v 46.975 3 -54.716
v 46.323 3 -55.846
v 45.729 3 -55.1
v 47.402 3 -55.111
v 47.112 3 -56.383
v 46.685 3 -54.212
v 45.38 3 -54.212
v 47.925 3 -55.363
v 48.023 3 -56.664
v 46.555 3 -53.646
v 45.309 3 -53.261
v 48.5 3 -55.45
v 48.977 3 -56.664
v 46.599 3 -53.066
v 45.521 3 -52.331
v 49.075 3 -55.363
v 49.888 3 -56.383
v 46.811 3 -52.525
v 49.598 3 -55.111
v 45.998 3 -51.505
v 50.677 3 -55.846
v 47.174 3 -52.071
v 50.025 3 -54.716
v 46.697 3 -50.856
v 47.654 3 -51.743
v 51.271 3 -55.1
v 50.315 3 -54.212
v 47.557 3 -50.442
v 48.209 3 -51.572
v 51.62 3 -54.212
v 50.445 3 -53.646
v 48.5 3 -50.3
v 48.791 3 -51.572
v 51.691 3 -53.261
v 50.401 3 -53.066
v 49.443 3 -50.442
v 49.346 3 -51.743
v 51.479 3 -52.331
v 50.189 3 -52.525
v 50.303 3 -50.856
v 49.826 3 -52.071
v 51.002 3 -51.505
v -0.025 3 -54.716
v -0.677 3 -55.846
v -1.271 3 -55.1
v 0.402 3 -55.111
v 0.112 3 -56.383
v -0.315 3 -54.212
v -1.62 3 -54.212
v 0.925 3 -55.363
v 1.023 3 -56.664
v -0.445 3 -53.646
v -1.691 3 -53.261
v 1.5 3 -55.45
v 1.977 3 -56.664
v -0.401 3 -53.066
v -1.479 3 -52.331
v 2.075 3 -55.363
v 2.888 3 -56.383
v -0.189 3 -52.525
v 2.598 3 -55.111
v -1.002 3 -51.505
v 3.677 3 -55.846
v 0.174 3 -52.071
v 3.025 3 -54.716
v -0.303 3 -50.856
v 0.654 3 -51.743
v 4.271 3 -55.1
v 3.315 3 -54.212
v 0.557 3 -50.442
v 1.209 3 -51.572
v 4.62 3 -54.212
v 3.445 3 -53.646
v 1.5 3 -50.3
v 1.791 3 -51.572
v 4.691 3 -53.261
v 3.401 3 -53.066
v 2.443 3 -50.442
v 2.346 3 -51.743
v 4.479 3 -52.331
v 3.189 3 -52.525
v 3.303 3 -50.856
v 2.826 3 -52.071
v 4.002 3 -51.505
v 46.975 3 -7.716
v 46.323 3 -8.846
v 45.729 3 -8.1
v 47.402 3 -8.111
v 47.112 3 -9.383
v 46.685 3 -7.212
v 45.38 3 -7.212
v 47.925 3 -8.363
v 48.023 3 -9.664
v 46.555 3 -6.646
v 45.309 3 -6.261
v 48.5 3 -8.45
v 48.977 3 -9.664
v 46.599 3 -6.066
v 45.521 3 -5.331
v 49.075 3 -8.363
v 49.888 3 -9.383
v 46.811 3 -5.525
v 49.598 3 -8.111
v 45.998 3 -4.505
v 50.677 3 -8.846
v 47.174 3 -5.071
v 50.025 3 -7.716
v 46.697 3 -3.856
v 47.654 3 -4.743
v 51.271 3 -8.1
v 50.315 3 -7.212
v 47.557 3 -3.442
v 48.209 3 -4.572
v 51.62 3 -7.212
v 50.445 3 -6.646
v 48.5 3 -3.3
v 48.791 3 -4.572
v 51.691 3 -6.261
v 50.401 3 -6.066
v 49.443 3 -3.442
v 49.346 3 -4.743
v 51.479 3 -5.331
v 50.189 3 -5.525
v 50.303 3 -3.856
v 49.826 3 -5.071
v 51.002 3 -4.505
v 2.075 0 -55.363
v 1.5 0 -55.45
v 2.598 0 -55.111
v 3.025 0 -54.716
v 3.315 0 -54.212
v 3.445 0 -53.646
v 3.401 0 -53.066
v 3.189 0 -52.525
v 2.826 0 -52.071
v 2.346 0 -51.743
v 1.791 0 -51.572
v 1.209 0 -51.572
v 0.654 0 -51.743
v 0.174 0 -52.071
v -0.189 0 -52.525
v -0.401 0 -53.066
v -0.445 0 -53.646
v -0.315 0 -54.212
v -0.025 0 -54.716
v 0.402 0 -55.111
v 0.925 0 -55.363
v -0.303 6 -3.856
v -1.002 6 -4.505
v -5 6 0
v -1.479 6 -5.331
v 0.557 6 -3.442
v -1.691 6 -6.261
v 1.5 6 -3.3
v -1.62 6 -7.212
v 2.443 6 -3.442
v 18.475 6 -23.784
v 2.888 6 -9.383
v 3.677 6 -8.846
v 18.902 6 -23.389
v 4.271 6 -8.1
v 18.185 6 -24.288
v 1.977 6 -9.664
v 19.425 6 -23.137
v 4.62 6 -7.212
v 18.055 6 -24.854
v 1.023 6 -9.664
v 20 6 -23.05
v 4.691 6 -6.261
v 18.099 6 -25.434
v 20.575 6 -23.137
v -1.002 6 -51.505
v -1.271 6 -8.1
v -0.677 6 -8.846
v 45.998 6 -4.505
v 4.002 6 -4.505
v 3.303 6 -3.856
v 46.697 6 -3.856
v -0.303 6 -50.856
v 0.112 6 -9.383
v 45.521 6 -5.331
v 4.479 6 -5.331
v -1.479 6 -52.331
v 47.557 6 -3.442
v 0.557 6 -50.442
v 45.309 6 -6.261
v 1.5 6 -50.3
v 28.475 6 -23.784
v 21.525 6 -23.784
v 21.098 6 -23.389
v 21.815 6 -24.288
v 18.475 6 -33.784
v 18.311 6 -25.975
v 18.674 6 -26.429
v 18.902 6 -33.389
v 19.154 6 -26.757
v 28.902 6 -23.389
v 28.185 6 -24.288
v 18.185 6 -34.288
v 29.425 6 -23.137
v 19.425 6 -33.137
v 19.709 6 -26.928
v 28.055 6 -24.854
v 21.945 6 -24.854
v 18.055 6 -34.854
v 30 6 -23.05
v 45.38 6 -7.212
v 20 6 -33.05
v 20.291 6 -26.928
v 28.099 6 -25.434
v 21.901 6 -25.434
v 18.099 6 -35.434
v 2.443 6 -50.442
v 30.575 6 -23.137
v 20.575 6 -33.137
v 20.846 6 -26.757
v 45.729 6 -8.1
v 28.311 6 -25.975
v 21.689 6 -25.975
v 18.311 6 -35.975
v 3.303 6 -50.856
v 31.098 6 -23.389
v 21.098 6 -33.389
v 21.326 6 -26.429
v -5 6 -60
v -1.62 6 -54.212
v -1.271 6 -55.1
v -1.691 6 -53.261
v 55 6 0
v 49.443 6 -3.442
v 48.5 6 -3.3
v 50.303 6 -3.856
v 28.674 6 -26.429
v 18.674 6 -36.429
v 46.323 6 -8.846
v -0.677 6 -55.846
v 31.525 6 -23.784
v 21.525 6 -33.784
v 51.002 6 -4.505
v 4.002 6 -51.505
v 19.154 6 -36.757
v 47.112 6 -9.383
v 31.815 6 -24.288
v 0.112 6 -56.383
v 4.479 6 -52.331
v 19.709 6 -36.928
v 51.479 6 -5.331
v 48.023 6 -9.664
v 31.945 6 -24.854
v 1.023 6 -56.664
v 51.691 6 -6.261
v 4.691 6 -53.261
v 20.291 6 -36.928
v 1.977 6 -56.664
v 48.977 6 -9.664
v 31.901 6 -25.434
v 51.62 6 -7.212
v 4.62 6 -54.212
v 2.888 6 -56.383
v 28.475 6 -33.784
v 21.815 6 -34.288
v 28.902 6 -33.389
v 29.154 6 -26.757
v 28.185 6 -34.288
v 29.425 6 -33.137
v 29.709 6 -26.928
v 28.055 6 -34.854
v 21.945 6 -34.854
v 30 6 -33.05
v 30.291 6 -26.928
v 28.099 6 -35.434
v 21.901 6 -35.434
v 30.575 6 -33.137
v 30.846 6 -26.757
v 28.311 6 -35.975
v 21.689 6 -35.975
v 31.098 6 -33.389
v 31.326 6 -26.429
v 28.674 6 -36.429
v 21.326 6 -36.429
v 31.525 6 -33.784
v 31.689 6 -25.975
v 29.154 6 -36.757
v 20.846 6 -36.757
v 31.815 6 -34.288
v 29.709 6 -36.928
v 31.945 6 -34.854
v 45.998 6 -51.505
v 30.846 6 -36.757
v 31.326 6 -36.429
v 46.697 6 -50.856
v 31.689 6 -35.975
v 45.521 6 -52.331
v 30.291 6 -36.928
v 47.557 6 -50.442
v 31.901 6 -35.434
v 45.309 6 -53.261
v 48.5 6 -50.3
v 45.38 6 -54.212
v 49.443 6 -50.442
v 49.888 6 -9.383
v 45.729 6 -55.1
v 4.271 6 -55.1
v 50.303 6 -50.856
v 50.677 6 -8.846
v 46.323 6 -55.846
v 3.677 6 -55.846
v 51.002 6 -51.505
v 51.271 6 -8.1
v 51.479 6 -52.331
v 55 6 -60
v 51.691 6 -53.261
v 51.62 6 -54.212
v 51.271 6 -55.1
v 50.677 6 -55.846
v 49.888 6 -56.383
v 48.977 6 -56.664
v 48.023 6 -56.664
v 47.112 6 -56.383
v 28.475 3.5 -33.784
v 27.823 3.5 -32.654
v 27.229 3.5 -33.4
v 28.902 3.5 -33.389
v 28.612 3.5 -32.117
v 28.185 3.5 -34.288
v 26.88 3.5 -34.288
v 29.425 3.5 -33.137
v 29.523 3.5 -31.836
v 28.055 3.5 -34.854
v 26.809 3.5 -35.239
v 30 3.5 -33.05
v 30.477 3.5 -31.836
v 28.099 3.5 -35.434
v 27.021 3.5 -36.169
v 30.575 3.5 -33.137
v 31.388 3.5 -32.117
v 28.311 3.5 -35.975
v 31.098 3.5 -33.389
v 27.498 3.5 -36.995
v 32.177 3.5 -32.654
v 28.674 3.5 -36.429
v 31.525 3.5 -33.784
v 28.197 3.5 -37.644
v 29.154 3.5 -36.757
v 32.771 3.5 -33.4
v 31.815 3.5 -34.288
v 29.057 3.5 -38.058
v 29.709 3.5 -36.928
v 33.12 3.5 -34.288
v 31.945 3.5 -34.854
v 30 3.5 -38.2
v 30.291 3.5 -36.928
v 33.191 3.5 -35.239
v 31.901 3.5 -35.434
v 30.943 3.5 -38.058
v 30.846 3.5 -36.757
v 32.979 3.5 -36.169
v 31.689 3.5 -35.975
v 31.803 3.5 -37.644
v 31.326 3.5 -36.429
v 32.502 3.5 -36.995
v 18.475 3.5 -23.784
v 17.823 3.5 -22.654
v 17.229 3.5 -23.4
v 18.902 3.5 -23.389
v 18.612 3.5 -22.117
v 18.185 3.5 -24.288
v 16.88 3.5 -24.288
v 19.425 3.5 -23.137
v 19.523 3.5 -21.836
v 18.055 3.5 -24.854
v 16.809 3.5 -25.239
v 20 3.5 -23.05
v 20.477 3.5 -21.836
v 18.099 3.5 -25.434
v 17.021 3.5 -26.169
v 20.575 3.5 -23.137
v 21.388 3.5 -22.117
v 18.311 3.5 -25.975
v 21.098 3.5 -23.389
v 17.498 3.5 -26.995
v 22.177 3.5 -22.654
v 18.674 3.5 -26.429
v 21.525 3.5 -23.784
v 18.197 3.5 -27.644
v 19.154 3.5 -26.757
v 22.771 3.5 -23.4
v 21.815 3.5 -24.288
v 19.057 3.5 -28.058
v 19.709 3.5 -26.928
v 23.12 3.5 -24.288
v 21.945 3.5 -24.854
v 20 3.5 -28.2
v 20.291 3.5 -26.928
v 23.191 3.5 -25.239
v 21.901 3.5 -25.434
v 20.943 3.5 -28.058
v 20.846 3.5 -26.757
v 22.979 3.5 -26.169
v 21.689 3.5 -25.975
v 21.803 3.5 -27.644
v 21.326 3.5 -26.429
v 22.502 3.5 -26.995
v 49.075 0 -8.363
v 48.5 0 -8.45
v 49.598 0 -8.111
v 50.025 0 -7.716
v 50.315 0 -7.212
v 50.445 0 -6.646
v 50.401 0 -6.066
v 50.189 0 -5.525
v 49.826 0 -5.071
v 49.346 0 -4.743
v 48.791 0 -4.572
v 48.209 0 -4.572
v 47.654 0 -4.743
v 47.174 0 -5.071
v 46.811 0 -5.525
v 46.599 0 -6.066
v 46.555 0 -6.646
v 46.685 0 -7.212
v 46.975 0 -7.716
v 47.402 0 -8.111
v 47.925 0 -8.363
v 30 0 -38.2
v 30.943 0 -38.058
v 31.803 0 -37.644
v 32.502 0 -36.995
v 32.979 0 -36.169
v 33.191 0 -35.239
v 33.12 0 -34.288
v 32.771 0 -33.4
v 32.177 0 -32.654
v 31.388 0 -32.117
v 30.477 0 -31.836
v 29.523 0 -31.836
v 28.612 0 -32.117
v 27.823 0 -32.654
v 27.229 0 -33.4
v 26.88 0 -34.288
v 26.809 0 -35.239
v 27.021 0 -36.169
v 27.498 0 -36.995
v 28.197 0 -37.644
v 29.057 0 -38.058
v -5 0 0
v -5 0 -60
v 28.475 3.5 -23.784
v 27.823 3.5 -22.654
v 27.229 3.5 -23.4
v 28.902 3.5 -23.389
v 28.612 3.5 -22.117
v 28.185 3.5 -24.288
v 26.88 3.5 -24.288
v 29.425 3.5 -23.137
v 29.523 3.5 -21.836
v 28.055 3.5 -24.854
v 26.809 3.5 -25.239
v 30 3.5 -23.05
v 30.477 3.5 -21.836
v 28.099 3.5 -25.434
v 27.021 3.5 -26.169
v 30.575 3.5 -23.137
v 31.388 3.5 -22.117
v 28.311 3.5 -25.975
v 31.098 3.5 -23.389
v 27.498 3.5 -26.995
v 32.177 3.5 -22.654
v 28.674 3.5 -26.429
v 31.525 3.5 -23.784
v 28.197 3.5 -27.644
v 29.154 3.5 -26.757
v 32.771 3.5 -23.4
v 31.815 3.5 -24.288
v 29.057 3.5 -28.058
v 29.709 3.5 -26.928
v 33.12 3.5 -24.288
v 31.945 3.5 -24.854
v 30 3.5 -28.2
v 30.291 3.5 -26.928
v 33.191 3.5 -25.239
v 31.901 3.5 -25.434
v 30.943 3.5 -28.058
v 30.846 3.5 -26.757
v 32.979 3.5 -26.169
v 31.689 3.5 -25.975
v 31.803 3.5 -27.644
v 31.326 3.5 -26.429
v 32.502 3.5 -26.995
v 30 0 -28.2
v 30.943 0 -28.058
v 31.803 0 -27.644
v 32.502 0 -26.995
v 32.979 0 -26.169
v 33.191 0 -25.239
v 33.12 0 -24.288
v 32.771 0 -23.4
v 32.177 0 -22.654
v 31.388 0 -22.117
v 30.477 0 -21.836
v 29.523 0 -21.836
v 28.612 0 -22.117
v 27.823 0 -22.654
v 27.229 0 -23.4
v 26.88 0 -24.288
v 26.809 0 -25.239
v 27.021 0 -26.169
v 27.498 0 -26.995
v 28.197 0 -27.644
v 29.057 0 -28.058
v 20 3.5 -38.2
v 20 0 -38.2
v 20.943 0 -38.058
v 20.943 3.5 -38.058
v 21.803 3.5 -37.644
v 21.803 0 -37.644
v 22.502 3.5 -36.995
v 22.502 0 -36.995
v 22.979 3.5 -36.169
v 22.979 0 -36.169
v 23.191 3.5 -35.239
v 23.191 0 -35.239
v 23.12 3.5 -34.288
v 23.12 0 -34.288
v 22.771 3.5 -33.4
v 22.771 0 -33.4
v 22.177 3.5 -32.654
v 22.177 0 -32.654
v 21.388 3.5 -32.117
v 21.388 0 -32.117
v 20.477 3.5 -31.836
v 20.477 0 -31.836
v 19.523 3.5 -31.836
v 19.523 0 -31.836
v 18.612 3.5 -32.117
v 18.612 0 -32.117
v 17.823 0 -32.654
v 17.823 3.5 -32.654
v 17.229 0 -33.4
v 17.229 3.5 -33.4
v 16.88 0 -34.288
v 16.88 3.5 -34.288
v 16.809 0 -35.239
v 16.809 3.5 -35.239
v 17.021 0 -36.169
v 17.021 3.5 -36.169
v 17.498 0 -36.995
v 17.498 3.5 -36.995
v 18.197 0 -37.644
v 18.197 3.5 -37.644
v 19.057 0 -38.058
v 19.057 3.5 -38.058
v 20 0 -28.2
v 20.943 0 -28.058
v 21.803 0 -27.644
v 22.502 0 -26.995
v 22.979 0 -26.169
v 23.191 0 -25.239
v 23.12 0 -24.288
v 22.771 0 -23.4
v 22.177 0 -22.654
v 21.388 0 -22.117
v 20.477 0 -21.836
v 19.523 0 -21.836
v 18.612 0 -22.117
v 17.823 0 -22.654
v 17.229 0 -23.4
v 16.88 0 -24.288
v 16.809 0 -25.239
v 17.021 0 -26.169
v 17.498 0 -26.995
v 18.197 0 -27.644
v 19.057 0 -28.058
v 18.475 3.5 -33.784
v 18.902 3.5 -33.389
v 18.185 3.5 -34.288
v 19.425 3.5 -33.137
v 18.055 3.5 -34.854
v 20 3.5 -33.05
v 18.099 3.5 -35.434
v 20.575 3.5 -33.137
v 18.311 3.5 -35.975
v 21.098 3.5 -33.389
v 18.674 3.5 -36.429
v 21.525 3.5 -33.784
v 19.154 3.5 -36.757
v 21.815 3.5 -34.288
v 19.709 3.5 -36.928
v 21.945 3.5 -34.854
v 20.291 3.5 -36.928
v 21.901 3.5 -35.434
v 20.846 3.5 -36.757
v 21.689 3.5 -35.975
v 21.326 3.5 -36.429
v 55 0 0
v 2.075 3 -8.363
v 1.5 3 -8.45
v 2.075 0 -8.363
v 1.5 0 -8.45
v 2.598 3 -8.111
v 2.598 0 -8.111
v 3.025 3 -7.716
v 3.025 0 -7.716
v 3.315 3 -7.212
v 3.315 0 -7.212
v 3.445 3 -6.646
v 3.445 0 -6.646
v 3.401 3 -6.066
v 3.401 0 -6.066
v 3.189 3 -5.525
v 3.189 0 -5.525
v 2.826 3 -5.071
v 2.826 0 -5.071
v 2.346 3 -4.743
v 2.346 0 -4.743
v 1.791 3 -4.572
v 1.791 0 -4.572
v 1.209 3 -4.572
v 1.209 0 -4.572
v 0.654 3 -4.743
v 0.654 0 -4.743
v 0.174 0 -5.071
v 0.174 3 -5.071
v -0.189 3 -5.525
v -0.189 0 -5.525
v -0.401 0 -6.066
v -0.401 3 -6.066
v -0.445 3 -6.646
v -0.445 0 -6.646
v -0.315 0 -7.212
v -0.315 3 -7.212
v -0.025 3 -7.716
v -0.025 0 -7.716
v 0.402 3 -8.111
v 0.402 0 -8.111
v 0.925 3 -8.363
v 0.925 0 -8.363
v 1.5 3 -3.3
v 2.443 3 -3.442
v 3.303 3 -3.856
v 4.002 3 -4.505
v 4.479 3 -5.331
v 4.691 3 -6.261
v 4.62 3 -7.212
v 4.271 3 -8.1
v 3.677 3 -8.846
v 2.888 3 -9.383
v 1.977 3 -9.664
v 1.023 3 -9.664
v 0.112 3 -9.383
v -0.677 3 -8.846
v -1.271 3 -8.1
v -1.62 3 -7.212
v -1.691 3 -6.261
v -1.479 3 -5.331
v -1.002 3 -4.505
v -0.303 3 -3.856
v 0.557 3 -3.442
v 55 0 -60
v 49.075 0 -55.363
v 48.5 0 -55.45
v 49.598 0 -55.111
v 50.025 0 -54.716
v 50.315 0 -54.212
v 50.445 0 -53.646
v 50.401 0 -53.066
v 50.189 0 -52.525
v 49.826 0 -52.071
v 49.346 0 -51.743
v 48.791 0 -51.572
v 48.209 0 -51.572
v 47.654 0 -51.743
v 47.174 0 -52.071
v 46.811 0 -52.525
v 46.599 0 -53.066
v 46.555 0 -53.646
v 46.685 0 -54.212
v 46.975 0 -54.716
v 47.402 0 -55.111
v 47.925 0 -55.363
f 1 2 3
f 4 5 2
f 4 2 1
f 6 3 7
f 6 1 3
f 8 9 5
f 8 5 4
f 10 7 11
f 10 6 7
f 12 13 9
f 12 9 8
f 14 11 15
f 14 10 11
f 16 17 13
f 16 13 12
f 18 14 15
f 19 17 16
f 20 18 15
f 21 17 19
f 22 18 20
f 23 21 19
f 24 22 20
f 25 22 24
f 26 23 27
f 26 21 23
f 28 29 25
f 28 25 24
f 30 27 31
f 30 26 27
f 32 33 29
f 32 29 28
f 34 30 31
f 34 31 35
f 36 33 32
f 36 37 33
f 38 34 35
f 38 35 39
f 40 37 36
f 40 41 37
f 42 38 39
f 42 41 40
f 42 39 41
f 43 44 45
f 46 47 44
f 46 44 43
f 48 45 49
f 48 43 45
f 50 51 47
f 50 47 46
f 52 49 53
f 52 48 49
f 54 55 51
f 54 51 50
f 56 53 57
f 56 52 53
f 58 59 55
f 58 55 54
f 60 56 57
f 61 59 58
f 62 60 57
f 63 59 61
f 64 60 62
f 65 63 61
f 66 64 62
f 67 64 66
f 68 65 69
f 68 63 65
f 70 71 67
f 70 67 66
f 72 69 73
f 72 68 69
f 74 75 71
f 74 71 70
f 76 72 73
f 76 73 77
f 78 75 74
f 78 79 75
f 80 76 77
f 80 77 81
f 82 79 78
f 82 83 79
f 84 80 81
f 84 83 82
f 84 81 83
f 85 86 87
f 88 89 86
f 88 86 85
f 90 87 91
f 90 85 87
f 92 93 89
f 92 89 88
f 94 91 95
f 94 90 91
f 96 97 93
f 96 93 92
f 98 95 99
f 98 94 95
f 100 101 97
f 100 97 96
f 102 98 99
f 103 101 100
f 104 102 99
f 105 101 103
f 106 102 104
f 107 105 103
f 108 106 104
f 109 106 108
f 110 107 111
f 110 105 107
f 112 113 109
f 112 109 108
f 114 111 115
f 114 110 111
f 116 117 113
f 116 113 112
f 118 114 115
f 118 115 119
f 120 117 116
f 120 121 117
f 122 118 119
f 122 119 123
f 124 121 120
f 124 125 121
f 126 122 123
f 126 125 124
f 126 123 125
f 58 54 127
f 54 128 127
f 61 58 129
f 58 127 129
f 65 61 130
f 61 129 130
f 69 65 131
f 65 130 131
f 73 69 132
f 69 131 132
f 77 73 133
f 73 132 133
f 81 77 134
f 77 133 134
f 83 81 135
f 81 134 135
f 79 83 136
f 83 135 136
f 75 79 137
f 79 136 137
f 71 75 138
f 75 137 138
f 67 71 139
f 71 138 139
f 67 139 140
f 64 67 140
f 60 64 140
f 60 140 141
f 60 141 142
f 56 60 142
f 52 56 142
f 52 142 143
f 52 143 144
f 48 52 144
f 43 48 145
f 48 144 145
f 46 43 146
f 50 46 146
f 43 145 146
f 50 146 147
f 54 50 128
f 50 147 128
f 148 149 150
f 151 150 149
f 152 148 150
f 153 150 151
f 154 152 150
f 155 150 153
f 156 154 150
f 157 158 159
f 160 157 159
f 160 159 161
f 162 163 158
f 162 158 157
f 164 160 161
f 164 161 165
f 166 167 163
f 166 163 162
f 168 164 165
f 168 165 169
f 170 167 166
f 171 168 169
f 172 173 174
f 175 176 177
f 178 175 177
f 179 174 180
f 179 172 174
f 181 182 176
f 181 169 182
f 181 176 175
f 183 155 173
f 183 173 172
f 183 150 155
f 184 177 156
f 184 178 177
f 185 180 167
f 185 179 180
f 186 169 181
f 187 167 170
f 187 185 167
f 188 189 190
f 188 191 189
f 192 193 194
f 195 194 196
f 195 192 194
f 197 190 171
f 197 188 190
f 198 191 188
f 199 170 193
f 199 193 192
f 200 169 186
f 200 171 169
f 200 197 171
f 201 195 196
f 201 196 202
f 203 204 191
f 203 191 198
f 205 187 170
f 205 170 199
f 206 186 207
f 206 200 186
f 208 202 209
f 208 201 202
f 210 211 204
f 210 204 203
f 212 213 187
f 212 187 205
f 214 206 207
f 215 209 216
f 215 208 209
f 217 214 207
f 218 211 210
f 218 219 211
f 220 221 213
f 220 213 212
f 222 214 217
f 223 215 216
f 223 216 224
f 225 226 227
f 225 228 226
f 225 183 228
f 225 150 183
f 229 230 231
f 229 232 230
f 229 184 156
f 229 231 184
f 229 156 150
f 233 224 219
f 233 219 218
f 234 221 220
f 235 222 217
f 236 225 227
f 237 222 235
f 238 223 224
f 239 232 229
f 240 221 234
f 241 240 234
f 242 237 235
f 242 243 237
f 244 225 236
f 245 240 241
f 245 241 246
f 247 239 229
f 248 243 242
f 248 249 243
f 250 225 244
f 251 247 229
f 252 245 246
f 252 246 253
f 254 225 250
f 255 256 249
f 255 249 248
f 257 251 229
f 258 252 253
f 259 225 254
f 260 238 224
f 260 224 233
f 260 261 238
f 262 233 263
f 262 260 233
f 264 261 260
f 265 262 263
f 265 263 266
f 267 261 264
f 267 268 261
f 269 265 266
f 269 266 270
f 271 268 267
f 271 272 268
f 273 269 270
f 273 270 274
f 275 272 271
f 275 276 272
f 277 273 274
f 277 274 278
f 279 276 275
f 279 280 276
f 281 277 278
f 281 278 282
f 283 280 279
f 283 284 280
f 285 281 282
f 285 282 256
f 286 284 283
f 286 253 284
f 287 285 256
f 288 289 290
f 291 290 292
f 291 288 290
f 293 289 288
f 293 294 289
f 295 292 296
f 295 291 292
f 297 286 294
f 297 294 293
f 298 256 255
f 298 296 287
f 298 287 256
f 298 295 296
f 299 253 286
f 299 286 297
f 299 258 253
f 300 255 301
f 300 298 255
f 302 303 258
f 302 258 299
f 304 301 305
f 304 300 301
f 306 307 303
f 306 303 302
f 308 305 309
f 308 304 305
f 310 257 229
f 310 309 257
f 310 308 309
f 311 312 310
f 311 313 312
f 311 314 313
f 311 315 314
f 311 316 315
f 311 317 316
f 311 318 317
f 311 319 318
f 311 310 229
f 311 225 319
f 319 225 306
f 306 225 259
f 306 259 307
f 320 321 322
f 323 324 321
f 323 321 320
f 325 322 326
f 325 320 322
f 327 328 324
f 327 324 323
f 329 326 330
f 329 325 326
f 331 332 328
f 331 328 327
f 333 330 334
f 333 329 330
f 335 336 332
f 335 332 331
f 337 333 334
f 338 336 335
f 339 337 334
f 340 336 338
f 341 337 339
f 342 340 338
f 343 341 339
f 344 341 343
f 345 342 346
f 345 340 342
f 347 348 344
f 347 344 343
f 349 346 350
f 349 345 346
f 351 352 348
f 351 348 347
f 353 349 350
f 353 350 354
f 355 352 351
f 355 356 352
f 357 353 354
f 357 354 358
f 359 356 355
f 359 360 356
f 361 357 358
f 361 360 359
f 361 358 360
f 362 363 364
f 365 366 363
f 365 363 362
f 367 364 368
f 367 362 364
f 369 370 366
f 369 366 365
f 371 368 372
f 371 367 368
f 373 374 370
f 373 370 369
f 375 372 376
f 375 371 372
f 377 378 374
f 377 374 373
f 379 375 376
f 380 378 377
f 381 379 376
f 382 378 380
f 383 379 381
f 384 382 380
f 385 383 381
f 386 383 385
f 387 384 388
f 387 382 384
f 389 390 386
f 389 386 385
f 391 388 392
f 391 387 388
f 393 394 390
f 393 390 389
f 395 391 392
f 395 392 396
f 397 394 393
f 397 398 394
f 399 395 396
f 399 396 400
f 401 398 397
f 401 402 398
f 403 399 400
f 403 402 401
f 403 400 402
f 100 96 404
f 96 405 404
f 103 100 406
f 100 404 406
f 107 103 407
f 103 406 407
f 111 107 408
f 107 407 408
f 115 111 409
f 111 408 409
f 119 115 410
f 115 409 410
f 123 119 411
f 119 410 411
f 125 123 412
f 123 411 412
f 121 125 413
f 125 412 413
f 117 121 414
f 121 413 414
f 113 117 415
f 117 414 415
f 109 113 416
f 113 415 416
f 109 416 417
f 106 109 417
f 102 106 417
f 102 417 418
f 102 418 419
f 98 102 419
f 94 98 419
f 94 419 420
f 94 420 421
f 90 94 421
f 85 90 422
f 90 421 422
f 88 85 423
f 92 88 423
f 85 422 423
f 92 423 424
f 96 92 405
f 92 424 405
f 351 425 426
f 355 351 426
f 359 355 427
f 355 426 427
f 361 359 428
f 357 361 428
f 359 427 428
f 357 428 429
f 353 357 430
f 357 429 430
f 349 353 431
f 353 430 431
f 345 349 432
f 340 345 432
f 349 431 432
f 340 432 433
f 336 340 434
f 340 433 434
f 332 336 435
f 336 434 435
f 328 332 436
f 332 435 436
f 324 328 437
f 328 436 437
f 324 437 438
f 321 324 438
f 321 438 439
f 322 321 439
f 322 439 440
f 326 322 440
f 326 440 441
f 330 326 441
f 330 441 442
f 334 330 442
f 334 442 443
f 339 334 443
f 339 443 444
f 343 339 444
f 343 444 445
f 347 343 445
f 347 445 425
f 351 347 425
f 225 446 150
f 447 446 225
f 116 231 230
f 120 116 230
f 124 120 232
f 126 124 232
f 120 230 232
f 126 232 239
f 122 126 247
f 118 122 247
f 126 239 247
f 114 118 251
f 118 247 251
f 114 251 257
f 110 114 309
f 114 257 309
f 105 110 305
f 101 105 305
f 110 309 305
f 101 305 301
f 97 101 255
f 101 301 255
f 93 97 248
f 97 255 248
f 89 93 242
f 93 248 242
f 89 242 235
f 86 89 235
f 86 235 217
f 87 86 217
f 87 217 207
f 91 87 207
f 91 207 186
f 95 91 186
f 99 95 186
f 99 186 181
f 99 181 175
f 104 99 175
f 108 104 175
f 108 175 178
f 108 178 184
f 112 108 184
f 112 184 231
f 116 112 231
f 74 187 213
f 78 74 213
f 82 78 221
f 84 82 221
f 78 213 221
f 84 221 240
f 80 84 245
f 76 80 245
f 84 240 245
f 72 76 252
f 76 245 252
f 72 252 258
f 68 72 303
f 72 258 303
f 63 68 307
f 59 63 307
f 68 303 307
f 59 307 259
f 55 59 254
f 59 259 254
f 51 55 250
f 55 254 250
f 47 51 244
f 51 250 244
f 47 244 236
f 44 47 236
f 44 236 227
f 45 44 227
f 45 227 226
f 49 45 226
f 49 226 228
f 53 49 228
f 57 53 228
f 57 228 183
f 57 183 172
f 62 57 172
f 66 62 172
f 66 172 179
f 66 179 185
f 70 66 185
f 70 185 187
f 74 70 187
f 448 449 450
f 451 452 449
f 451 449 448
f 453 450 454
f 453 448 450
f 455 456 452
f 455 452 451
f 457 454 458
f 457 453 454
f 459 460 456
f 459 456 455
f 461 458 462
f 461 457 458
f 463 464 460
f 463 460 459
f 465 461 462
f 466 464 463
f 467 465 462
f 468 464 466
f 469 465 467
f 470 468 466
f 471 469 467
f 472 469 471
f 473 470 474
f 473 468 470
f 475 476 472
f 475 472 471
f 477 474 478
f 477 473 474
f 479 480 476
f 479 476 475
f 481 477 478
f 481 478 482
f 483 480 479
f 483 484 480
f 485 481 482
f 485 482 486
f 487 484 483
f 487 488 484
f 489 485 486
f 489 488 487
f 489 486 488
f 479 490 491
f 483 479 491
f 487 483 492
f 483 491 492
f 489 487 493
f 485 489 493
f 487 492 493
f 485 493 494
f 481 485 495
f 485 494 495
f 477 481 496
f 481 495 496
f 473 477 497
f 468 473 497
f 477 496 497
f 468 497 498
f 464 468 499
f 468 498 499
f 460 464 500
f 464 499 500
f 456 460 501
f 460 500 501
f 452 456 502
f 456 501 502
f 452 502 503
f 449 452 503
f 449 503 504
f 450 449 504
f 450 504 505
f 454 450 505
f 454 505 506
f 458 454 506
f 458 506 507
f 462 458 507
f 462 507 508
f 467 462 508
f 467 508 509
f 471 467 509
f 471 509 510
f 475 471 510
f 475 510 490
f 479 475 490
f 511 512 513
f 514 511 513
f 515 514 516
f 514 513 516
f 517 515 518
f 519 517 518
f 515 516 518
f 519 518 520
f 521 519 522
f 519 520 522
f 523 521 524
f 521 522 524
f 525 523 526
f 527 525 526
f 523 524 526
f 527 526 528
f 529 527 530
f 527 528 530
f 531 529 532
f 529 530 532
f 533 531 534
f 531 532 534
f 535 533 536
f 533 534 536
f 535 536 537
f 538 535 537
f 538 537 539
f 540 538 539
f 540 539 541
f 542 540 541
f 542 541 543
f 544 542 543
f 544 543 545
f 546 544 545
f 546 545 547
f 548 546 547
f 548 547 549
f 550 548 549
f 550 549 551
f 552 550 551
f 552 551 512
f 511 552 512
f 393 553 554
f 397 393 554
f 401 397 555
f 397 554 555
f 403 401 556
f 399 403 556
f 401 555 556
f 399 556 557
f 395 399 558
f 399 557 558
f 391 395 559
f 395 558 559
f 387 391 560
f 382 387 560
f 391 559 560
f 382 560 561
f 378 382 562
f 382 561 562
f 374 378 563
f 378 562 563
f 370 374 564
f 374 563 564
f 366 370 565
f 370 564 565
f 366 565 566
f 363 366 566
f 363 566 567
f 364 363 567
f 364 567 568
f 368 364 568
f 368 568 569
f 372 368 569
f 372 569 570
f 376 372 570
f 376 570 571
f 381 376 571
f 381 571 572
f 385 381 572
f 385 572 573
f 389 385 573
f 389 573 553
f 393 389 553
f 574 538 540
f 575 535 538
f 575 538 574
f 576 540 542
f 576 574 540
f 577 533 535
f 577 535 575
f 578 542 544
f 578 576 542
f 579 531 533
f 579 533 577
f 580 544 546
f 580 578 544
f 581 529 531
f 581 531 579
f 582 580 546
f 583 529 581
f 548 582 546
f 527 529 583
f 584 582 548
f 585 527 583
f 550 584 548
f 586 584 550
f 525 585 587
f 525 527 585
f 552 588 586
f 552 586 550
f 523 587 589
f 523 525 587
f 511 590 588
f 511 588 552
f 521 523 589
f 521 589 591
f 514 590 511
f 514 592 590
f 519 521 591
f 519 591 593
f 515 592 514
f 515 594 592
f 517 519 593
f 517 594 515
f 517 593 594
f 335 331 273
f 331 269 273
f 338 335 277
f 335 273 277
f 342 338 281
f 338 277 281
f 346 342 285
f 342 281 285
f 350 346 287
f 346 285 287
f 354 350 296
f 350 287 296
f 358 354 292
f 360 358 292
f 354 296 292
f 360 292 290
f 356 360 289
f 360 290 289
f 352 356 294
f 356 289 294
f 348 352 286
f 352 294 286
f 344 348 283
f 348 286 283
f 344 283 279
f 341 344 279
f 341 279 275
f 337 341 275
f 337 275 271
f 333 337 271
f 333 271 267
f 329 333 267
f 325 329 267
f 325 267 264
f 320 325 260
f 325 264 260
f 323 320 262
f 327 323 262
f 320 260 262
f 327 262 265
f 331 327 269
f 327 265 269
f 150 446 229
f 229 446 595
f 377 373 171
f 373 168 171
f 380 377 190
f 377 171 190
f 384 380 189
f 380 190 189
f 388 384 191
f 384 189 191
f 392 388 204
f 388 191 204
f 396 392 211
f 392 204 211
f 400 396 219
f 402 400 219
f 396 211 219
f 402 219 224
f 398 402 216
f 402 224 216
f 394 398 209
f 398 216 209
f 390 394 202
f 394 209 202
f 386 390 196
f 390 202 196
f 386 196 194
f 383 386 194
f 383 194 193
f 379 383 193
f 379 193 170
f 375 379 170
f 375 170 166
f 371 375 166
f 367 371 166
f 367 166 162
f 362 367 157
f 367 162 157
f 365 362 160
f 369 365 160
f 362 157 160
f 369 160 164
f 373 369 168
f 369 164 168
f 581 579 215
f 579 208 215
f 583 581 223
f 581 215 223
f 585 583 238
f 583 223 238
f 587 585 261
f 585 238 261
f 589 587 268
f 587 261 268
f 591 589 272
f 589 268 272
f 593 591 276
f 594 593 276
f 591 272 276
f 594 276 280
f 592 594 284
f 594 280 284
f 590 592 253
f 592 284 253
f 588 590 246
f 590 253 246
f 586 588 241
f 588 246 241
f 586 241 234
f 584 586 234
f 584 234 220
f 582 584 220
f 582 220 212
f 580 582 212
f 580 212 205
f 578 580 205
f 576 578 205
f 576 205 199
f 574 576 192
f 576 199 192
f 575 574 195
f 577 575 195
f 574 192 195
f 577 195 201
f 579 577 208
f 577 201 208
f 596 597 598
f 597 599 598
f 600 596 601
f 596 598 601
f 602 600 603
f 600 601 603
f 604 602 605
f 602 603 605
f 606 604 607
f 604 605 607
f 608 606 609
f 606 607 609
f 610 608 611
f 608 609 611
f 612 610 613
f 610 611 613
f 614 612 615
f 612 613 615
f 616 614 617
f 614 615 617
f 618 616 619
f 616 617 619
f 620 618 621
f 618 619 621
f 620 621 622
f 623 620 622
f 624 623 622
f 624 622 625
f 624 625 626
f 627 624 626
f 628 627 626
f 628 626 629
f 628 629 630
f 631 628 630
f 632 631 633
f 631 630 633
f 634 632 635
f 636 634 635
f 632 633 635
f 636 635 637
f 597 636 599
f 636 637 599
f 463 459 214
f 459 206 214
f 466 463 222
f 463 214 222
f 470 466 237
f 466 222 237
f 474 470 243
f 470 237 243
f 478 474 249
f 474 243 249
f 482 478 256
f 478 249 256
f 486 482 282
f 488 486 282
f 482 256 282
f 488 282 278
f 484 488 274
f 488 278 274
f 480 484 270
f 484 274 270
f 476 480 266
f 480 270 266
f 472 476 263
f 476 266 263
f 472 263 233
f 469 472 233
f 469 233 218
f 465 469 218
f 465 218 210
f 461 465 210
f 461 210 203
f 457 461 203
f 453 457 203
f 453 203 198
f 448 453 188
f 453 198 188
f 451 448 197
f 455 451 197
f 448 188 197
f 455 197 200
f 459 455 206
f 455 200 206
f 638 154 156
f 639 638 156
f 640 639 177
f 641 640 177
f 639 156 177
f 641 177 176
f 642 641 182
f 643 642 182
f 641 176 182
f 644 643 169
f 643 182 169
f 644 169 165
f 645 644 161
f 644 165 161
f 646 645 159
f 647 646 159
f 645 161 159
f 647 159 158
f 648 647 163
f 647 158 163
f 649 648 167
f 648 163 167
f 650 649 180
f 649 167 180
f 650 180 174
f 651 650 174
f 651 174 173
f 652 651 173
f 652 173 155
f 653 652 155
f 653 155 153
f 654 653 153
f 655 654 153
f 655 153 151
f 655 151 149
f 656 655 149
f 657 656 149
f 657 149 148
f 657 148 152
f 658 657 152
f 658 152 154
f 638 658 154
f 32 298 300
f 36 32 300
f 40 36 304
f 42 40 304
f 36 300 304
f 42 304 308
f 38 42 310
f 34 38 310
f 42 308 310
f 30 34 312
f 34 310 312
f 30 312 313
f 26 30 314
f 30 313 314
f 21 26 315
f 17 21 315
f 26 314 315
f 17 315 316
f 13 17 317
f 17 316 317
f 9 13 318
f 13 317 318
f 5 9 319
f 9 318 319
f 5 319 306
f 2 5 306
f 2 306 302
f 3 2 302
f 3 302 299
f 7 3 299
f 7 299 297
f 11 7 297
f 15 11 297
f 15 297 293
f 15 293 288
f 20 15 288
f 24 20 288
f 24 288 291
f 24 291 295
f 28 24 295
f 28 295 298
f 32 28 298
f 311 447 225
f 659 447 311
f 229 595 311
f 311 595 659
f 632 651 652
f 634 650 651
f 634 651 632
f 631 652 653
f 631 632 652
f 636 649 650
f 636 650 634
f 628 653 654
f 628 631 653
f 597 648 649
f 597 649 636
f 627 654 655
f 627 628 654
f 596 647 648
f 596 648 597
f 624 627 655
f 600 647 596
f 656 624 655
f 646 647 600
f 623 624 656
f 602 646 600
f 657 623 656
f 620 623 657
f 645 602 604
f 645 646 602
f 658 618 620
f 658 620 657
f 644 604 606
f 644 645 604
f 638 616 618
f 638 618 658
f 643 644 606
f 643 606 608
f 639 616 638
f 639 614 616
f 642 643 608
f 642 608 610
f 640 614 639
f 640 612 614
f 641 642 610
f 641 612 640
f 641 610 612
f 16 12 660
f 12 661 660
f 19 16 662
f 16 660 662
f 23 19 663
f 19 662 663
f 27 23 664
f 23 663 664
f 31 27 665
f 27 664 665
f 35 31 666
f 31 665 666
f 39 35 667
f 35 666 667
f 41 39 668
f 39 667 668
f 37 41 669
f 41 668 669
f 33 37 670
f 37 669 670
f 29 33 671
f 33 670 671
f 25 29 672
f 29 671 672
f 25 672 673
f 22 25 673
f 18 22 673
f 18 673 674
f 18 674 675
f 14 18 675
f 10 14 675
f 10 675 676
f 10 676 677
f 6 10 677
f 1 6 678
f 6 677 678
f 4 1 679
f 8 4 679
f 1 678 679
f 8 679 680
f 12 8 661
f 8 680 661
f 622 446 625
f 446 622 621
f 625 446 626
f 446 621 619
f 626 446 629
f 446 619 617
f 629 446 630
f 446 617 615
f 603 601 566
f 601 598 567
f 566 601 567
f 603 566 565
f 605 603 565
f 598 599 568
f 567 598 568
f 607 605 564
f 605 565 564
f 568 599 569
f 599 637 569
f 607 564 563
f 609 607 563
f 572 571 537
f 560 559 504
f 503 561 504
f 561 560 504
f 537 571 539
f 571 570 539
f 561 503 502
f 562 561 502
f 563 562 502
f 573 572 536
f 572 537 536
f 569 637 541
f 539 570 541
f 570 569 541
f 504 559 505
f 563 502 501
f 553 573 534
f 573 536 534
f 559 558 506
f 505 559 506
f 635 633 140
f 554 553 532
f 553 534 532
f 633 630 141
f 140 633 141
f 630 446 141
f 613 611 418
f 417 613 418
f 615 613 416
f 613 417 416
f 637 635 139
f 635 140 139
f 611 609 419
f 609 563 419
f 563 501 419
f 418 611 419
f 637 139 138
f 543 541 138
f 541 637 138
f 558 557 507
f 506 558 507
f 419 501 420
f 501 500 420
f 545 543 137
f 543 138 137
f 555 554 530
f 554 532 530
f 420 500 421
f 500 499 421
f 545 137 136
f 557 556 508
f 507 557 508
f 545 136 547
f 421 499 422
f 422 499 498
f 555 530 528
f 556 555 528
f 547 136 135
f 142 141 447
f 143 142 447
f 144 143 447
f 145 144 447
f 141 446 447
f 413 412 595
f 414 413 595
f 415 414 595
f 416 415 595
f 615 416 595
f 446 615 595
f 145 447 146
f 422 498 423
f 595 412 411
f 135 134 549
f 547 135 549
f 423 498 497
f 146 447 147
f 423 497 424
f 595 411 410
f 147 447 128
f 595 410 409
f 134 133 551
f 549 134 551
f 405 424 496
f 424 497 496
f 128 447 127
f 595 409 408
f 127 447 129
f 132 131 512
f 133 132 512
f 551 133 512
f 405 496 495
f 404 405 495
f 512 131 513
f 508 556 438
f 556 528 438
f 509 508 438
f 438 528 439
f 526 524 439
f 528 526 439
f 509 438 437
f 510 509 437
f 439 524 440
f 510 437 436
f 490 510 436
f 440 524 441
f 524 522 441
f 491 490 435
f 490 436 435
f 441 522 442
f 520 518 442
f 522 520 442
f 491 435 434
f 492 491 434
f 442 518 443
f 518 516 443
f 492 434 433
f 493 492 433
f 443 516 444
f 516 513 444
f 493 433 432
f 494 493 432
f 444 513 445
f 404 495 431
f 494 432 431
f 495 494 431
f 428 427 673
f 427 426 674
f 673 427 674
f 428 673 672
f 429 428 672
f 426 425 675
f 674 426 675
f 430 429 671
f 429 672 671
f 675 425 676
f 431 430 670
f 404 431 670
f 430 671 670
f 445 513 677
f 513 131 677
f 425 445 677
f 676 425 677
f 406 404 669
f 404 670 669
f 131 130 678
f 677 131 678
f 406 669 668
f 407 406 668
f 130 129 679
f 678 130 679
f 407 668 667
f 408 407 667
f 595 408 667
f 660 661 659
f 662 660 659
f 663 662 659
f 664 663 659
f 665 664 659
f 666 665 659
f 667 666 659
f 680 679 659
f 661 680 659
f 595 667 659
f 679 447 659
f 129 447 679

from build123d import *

# Parameters (mm, degrees)
SKIZZE1_W                       = 60
SKIZZE1_H                       = 60
AUFSATZ_LINEAR_AUSTRAGEN1_DEPTH = 6
BOHRUNG3_D                      = 3.9
BOHRUNG3_CBORE_D                = 6.4
BOHRUNG3_CBORE_DEPTH            = 3.5
BOHRUNG4_D                      = 3.9
BOHRUNG4_DEPTH                  = 100
BOHRUNG4_CBORE_D                = 6.4
BOHRUNG4_CBORE_DEPTH            = 3


with BuildPart() as part:
    # Skizze1 → Aufsatz-Linear austragen1 (new body)
    with BuildSketch(Plane(origin=(0, 0, 0), x_dir=(1, 0, 0), z_dir=(0, 1, 0))):
        with Locations((25, 30)):
            Rectangle(SKIZZE1_W, SKIZZE1_H)
    extrude(amount=AUFSATZ_LINEAR_AUSTRAGEN1_DEPTH)

    # Bohrung3 (through all)
    with Locations(Plane(origin=(20, 0, -25), x_dir=(0, 0, -1), z_dir=(0, -1, 0))):
        with Locations((0, 0), (0, 10), (10, 10), (10, 0)):
            CounterBoreHole(BOHRUNG3_D / 2, BOHRUNG3_CBORE_D / 2, BOHRUNG3_CBORE_DEPTH)

    # Bohrung4
    with Locations(Plane(origin=(1.5, 6, -53.5), x_dir=(0, 0, 1), z_dir=(0, 1, 0))):
        with Locations((0, 0), (0, 47), (47, 47), (47, 0)):
            CounterBoreHole(BOHRUNG4_D / 2, BOHRUNG4_CBORE_D / 2, BOHRUNG4_CBORE_DEPTH, depth=BOHRUNG4_DEPTH)


solid = part.part
